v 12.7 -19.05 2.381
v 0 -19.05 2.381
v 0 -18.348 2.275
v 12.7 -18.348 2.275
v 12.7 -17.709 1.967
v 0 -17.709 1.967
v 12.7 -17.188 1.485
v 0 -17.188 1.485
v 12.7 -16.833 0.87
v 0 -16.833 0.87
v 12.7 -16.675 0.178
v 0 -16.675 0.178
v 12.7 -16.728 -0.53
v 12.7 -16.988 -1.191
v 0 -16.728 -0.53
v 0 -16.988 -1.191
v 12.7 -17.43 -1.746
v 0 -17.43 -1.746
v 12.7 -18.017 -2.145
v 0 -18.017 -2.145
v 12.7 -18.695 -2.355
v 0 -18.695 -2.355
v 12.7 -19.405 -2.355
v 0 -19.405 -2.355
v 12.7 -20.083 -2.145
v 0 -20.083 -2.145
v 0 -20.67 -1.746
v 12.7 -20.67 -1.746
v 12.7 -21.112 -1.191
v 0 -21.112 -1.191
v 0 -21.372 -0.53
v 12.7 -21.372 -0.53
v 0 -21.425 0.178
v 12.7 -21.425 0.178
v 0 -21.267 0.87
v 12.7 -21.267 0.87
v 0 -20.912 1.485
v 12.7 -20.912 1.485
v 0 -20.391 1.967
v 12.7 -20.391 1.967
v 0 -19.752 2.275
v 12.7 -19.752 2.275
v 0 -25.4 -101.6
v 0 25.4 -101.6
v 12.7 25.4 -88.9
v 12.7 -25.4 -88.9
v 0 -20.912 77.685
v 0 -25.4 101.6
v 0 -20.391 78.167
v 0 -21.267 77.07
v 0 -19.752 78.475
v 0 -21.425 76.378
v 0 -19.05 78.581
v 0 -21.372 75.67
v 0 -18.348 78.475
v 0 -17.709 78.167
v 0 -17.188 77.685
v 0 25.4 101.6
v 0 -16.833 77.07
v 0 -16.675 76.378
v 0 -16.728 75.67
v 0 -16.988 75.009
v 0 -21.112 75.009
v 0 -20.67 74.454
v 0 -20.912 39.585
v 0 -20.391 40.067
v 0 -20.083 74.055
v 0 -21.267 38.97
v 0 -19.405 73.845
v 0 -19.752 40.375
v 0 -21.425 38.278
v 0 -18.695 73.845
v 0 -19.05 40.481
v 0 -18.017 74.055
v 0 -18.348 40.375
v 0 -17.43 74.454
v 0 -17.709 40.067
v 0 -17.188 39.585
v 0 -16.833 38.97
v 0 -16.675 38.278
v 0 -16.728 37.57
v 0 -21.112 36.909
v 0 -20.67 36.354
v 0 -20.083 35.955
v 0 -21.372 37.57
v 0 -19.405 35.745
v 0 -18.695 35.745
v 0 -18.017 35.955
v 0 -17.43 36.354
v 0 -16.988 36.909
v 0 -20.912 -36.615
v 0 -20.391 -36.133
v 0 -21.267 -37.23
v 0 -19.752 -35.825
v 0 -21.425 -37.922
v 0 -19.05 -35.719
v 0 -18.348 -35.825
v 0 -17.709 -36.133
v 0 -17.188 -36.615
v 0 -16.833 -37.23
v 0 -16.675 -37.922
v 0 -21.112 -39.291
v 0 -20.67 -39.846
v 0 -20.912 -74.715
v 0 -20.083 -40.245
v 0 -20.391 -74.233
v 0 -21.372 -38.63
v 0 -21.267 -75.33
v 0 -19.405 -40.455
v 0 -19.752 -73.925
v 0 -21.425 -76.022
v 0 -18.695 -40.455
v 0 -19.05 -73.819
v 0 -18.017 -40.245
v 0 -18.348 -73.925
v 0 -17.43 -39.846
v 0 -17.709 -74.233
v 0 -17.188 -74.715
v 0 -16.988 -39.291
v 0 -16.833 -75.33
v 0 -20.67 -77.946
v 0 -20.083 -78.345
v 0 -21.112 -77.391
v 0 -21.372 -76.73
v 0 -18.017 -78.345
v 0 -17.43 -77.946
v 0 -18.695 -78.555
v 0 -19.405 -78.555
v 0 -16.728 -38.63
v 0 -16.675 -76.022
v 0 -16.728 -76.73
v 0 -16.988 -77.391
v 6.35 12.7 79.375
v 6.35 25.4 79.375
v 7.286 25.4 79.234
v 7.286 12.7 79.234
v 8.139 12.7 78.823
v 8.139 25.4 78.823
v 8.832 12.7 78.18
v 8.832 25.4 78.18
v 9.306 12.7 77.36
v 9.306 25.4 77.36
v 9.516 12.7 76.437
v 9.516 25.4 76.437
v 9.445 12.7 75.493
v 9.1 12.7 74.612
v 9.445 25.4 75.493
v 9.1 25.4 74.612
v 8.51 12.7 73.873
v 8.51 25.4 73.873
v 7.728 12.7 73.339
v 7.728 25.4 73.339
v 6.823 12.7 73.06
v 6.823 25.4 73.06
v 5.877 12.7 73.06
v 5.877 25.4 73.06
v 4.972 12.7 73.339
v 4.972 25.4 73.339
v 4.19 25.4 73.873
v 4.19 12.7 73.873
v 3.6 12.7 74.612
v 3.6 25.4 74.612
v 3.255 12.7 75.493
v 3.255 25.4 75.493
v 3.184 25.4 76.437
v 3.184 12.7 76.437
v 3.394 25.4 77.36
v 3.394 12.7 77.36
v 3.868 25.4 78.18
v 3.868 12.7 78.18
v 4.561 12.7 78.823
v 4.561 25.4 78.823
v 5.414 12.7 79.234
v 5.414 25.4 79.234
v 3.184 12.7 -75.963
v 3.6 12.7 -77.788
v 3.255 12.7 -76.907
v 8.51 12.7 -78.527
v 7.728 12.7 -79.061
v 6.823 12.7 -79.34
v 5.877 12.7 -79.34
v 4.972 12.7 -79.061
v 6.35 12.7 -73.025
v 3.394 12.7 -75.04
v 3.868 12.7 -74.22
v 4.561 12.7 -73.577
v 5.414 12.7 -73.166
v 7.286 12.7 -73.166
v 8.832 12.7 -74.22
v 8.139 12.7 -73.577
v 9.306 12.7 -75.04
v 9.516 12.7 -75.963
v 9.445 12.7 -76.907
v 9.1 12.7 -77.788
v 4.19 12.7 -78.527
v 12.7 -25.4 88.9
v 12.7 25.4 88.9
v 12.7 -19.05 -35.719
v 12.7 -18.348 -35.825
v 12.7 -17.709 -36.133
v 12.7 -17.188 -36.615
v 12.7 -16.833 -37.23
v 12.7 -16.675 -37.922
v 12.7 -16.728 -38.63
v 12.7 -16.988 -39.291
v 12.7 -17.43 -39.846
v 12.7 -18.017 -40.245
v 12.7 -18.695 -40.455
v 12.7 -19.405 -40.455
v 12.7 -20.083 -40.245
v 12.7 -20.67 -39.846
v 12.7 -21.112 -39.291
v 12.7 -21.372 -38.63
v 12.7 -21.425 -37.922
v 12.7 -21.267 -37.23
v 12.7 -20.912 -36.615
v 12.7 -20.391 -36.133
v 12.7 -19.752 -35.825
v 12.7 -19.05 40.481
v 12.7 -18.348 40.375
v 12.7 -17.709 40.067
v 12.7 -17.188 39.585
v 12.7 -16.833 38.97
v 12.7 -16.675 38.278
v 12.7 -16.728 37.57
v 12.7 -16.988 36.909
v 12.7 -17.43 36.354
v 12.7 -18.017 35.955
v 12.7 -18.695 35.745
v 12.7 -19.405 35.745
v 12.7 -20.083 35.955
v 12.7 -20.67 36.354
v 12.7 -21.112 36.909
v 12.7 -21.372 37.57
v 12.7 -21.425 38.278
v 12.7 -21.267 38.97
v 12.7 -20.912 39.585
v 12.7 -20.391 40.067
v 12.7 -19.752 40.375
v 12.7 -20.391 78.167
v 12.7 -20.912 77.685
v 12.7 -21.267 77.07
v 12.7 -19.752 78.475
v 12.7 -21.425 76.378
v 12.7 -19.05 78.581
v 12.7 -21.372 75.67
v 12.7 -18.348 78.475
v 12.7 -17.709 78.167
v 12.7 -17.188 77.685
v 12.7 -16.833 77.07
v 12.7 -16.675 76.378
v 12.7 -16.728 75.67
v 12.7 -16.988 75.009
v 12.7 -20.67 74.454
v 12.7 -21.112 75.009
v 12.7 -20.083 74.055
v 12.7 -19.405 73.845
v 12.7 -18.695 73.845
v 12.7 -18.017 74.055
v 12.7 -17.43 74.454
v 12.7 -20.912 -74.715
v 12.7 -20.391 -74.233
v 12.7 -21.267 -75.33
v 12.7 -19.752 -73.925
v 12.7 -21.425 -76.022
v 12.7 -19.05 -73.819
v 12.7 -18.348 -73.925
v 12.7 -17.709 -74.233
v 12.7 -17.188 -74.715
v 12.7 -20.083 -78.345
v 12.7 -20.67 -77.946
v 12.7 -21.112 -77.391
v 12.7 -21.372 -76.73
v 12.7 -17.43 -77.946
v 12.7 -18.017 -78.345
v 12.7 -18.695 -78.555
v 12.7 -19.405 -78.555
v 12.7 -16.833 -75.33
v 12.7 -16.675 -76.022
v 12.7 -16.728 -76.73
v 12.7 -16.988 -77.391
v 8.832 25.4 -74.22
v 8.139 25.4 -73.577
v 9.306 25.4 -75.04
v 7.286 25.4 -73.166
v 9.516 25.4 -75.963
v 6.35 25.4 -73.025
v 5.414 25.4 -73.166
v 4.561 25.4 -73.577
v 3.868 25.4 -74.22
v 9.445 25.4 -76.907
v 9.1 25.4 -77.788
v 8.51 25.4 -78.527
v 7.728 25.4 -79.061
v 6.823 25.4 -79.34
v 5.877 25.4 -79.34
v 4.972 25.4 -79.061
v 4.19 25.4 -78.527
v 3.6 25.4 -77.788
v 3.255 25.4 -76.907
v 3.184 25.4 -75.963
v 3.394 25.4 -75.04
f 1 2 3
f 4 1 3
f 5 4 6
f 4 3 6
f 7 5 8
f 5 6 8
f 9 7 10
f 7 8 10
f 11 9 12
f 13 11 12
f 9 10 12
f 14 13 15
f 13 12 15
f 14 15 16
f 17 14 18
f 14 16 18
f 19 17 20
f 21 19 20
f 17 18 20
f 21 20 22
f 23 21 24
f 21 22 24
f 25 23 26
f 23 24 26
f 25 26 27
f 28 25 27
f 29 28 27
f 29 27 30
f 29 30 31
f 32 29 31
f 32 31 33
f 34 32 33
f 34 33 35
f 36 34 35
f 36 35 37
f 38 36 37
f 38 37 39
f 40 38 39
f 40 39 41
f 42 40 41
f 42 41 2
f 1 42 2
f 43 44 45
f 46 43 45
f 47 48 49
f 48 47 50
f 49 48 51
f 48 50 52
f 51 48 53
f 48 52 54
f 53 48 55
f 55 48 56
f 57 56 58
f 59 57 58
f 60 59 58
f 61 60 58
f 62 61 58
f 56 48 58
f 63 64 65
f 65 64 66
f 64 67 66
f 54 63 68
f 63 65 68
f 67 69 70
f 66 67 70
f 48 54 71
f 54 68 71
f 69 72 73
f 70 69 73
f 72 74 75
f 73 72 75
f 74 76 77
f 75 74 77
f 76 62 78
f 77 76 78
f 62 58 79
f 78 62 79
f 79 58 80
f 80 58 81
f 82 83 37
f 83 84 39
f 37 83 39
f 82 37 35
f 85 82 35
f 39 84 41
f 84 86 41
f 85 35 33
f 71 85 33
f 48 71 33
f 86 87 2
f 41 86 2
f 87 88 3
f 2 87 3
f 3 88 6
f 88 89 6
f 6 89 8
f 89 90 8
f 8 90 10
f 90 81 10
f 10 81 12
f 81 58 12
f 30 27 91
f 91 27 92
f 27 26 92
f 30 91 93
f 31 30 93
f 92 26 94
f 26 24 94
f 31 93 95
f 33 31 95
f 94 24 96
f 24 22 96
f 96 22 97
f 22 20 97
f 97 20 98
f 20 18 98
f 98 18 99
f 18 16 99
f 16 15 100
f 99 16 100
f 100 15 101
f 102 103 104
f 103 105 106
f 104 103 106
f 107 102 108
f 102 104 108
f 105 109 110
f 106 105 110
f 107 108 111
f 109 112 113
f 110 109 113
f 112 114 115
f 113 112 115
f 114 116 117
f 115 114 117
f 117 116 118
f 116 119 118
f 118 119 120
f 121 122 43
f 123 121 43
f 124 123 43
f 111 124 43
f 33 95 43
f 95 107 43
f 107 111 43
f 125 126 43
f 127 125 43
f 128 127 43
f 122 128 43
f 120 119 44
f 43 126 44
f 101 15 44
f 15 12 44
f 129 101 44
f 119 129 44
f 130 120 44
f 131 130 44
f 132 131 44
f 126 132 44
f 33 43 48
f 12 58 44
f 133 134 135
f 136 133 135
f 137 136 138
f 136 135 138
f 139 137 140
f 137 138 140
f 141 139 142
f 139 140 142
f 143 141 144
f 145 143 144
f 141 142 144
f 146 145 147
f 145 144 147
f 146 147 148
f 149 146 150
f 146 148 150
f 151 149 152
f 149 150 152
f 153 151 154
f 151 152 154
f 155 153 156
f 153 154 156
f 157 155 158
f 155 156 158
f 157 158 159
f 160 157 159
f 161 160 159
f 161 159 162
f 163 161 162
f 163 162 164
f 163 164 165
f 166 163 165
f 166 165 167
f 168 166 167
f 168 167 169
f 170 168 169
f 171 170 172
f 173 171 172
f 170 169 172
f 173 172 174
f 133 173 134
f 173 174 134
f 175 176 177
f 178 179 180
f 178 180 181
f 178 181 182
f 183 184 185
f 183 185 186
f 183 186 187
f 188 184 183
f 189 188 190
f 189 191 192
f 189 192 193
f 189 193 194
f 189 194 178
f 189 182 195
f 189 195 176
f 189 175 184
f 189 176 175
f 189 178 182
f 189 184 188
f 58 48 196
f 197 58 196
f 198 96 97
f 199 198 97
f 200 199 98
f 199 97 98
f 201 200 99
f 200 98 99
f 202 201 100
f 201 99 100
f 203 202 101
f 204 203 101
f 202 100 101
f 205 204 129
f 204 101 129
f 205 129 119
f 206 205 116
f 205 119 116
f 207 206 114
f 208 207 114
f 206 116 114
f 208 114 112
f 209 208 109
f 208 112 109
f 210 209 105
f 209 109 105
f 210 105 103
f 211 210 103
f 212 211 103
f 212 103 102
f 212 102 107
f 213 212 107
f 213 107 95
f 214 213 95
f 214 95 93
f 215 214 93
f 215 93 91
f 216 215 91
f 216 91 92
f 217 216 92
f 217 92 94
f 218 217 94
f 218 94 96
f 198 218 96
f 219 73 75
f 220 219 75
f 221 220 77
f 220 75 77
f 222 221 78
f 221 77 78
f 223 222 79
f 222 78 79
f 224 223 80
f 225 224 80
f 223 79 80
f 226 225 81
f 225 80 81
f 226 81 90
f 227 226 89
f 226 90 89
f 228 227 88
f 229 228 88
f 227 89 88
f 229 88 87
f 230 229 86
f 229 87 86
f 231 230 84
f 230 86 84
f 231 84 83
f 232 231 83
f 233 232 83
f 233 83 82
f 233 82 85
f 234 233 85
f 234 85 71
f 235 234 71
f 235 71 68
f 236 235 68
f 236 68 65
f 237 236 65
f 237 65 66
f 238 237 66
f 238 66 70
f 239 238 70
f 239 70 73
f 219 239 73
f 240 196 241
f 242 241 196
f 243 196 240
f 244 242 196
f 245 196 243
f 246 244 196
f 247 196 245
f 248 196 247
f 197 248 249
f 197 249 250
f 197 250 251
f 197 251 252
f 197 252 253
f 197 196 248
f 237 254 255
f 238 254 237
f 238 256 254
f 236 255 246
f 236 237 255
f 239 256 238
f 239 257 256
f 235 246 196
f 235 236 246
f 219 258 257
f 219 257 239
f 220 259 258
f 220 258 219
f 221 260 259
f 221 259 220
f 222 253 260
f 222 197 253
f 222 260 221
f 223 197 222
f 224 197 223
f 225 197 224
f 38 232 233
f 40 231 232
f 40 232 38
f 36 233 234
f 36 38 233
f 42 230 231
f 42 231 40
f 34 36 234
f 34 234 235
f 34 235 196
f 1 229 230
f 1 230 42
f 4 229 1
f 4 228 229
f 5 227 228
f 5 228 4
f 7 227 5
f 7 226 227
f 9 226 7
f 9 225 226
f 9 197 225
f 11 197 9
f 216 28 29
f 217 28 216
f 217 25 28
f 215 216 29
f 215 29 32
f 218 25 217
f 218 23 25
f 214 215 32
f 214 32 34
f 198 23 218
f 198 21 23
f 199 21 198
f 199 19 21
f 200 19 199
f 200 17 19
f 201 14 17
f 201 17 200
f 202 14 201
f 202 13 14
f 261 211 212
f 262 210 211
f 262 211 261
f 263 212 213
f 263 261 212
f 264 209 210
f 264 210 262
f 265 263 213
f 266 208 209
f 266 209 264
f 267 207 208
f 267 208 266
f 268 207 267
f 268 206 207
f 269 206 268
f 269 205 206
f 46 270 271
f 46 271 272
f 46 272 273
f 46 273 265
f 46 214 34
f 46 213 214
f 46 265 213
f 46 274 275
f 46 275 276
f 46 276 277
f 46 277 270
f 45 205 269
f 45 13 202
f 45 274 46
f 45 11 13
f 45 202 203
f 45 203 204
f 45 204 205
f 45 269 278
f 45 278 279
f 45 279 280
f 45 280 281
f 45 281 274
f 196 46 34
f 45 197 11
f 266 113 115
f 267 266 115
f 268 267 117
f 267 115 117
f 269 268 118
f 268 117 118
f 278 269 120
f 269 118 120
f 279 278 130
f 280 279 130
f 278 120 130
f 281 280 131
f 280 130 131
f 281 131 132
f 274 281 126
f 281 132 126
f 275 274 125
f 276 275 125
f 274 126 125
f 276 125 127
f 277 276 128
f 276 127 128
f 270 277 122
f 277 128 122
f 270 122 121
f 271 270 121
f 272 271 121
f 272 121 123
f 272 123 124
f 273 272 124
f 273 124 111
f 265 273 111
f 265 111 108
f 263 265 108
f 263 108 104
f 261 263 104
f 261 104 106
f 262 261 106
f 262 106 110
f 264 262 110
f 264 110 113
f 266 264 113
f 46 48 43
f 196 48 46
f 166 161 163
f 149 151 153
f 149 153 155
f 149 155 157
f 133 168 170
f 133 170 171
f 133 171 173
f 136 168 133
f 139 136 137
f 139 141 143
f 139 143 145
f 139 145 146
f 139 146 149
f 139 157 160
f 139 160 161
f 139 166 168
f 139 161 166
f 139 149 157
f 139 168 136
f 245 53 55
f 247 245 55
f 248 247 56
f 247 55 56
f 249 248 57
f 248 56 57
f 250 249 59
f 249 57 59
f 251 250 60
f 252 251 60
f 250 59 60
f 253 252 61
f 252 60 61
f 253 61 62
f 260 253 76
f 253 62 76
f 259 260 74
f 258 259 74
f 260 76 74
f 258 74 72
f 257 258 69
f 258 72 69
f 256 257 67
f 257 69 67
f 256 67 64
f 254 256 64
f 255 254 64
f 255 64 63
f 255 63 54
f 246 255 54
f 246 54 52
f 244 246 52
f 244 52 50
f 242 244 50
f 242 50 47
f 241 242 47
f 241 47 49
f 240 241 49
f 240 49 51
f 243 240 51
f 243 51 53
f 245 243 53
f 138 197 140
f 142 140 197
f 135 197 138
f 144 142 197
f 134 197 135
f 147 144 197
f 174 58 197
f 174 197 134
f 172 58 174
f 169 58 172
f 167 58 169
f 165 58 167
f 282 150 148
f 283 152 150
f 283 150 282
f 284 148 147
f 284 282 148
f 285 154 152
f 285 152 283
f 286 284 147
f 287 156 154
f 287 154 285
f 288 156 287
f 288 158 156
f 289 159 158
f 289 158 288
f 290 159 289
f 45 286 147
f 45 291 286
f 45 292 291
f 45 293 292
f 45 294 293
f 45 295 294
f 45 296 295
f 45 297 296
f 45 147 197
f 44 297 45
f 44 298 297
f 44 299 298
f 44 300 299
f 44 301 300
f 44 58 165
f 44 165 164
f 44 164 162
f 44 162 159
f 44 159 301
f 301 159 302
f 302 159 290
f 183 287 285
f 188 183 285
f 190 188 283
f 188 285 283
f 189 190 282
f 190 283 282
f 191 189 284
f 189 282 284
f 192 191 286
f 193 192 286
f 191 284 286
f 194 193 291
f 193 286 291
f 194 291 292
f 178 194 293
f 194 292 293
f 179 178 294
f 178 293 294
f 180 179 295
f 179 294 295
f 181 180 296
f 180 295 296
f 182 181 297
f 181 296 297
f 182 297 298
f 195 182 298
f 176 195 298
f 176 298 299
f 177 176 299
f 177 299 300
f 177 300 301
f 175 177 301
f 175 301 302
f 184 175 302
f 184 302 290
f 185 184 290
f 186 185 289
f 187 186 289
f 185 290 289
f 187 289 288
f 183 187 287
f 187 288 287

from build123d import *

# Parameters (mm, degrees)
SKETCH1_W           = 203.2
SKETCH1_H           = 50.8
BOSS_EXTRUDE1_DEPTH = 12.7
CUT_EXTRUDE1_DEPTH  = 115.3
SKETCH4_R           = 2.38125
CUT_EXTRUDE3_DEPTH  = 106.494123059
LPATTERN1_COUNT     = 5
LPATTERN1_PITCH     = 38.1
SKETCH5_R           = 3.175
CUT_EXTRUDE4_DEPTH  = 12.7


with BuildPart() as part:
    # Sketch1 → Boss-Extrude1 (new body)
    with BuildSketch(Plane(origin=(0, 0, 0), x_dir=(0, 0, -1), z_dir=(1, 0, 0))):
        Rectangle(SKETCH1_W, SKETCH1_H)
    extrude(amount=BOSS_EXTRUDE1_DEPTH)

    # Sketch2 → Cut-Extrude1 (cut, through all)
    with BuildSketch(Plane(origin=(0, 25.4, 0), x_dir=(1, 0, 0), z_dir=(0, 1, 0))):
        Polygon((0, 101.6), (12.7, 88.9), (12.7, 101.6), align=None)
        Polygon((0, -101.6), (12.7, -88.9), (12.7, -101.6), align=None)
    extrude(amount=-CUT_EXTRUDE1_DEPTH, mode=Mode.SUBTRACT)

    # Sketch4 → Cut-Extrude3 (cut, through all)
    with BuildSketch(Plane.ZY):
        with Locations((-76.2, -19.05)):
            Circle(SKETCH4_R)
    cut_extrude3 = extrude(amount=-CUT_EXTRUDE3_DEPTH, mode=Mode.SUBTRACT)

    # LPattern1: Cut-Extrude3 ×5
    with Locations(*[(0, 0, i * LPATTERN1_PITCH) for i in range(1, LPATTERN1_COUNT)]):
        add(cut_extrude3, mode=Mode.SUBTRACT)

    # Sketch5 → Cut-Extrude4 (cut)
    with BuildSketch(Plane(origin=(0, 25.4, 0), x_dir=(1, 0, 0), z_dir=(0, 1, 0))):
        with Locations(Location((6.35, 76.2, 0), (0, 0, 270))):
            Circle(SKETCH5_R)
        with Locations(Location((6.35, -76.2, 0), (0, 0, 270))):
            Circle(SKETCH5_R)
    extrude(amount=-CUT_EXTRUDE4_DEPTH, mode=Mode.SUBTRACT)


solid = part.part
